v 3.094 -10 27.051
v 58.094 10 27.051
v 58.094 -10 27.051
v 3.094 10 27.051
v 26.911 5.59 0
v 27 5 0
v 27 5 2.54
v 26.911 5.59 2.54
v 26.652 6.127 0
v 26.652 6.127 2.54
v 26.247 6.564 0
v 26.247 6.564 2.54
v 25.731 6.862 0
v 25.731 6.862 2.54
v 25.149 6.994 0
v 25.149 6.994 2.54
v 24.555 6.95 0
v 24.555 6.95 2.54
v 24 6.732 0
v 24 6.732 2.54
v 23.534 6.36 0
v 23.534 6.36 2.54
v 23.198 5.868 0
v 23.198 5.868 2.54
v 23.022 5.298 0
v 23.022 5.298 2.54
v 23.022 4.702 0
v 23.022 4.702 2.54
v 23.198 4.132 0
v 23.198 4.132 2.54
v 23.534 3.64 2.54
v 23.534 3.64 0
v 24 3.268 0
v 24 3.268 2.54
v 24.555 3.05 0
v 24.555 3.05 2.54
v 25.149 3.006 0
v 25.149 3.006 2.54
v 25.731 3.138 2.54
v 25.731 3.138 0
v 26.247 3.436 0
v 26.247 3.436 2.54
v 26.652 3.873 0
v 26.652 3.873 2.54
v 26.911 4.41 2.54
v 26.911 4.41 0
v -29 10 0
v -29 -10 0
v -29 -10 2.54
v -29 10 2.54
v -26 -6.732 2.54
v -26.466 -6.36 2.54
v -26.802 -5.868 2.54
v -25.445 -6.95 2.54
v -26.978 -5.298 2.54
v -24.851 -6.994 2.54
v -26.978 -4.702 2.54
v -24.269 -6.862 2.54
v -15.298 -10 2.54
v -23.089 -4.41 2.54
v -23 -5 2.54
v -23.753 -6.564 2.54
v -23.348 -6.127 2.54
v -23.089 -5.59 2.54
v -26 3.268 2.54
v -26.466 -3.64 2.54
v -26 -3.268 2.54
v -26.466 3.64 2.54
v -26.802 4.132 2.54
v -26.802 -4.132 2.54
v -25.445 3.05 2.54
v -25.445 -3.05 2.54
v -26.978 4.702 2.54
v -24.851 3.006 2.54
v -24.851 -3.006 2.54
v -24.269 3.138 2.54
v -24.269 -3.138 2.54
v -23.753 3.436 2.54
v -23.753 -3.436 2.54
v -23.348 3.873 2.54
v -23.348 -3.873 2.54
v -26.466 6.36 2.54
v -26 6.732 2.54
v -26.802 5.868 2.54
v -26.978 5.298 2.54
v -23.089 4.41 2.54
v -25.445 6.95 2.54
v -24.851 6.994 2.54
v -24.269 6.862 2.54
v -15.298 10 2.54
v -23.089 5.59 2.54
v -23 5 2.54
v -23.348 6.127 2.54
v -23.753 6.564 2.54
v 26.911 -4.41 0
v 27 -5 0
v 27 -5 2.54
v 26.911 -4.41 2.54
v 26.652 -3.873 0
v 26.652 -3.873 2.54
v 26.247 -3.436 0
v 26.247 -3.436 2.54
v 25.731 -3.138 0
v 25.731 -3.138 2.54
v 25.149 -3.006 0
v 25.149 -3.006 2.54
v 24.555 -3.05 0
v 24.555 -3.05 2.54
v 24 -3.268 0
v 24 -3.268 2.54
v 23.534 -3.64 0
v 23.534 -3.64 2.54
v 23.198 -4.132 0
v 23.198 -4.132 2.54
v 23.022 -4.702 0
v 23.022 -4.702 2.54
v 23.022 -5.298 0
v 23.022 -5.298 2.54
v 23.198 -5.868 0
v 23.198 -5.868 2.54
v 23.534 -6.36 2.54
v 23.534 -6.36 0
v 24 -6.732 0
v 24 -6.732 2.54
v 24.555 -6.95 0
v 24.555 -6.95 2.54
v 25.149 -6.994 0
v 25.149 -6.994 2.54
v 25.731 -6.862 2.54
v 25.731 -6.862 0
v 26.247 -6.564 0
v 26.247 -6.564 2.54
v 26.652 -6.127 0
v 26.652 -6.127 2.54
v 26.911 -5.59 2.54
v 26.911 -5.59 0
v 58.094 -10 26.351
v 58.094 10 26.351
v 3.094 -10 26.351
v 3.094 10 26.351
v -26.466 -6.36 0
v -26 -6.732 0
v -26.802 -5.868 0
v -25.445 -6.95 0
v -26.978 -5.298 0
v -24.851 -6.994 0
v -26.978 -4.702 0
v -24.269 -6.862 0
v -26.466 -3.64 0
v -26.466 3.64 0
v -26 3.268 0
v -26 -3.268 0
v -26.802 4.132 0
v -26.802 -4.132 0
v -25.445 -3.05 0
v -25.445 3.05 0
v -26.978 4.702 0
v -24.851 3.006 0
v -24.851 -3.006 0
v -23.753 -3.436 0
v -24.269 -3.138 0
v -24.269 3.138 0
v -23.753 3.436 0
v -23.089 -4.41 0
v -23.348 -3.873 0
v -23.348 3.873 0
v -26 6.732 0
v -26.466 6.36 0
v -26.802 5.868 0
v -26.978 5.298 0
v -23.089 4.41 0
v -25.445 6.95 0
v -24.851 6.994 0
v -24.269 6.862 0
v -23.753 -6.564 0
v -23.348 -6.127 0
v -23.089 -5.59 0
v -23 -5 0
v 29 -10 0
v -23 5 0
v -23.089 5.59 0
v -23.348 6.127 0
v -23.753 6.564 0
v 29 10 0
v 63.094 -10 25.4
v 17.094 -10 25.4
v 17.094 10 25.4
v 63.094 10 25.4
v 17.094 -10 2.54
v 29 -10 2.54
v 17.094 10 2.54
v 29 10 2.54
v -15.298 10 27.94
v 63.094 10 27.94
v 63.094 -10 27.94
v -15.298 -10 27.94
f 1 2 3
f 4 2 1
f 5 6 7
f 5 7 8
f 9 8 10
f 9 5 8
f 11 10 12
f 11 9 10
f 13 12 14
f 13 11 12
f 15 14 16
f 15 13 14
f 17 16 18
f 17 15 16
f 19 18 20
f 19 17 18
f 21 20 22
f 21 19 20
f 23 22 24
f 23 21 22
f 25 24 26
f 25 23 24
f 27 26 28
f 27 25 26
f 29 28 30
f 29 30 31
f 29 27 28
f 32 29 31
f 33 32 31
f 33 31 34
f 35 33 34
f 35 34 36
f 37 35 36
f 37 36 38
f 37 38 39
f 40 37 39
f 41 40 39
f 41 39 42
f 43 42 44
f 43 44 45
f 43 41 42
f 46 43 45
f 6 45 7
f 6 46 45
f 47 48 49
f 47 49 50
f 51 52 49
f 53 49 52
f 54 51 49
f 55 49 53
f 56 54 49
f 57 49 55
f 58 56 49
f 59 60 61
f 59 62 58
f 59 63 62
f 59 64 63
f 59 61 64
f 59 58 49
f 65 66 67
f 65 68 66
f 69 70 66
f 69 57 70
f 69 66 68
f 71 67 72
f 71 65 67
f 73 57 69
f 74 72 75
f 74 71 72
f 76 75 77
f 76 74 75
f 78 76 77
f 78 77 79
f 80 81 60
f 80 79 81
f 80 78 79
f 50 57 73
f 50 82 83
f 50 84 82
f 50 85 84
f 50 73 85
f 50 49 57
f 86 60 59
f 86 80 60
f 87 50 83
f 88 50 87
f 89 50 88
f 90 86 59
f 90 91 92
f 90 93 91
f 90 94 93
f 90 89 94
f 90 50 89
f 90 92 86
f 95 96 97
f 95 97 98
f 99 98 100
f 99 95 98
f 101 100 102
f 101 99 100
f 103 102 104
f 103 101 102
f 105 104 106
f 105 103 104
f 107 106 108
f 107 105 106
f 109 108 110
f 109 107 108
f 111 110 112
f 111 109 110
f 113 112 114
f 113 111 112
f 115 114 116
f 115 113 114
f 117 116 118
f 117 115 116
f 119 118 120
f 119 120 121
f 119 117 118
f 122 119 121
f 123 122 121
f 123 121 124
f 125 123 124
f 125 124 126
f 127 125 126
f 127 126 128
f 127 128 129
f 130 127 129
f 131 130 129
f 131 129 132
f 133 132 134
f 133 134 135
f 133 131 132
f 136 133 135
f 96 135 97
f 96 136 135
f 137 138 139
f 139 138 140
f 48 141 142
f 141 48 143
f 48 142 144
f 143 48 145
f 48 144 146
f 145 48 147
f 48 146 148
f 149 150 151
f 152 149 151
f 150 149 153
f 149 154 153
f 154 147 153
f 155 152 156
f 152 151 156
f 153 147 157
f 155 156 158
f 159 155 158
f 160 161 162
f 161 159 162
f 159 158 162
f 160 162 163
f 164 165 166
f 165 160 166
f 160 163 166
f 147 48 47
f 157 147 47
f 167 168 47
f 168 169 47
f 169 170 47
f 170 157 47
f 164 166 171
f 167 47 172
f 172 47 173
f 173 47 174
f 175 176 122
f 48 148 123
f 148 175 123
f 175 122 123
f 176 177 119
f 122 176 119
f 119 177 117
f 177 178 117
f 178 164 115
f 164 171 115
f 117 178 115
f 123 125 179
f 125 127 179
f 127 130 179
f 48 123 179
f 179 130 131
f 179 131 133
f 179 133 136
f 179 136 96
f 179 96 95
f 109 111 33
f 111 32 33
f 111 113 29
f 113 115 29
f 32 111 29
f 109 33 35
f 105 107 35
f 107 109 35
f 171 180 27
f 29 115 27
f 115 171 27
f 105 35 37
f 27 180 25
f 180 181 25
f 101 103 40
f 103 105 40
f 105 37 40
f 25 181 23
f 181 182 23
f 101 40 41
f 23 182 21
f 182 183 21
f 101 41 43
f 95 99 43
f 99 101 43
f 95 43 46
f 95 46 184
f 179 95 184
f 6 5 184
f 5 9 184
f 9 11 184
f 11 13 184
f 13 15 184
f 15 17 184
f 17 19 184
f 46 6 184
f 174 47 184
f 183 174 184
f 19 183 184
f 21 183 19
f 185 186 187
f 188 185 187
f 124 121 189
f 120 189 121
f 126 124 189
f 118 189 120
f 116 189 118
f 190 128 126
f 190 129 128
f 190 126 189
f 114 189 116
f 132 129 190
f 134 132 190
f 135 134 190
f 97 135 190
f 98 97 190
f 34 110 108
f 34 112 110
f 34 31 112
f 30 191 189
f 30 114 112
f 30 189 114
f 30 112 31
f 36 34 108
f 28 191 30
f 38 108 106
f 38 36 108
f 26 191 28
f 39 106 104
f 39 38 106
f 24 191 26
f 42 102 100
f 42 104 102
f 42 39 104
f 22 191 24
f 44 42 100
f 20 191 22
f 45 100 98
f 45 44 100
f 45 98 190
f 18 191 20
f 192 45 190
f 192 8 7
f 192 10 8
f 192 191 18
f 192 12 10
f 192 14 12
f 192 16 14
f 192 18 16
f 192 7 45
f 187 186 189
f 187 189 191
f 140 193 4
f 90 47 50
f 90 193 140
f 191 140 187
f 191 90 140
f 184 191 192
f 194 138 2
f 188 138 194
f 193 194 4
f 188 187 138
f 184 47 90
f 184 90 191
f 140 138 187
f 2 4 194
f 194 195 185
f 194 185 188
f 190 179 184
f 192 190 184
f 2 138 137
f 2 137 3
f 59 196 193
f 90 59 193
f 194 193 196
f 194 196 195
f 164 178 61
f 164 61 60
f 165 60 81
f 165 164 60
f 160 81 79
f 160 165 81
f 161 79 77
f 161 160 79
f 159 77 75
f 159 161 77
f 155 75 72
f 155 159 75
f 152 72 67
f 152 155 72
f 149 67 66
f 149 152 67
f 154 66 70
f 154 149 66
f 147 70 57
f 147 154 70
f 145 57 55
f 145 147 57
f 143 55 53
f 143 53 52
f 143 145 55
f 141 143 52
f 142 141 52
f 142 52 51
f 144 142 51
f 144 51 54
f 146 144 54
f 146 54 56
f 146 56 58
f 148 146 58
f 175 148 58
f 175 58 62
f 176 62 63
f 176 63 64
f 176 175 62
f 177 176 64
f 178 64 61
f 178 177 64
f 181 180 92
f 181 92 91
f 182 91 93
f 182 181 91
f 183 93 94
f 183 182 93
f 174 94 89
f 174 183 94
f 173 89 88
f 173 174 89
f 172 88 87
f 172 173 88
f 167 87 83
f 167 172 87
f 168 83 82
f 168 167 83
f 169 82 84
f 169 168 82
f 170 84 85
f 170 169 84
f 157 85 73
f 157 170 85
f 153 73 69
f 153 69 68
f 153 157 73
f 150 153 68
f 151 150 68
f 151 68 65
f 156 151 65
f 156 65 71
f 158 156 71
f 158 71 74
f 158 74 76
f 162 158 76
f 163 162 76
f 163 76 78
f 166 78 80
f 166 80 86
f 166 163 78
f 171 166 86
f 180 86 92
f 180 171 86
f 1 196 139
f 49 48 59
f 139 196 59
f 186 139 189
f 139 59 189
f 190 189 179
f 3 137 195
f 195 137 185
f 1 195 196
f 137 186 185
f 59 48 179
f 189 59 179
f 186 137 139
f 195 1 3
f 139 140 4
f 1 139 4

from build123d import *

# Parameters (mm, degrees)
F0_W     = 58
F0_H     = 20
F0_R     = 2
F1_DEPTH = 2.54
F2_W     = 32.392131
F2_H     = 20
F3_DEPTH = 25.4
F4_W     = 20
F4_H     = 2.54
F5_DEPTH = 46
F6_W     = 55
F6_H     = 0.7
F7_DEPTH = 20.001


with BuildPart() as f1:
    # F0 (on Top) → F1 (new body)
    with BuildSketch(Plane.XY):
        Rectangle(F0_W, F0_H)
        with Locations((-25, -5)):
            Circle(F0_R, mode=Mode.SUBTRACT)
        with Locations((25, -5)):
            Circle(F0_R, mode=Mode.SUBTRACT)
        with Locations((-25, 5)):
            Circle(F0_R, mode=Mode.SUBTRACT)
        with Locations((25, 5)):
            Circle(F0_R, mode=Mode.SUBTRACT)
    extrude(amount=F1_DEPTH)

    # F2 (on face) → F3 (join)
    with BuildSketch(Plane.XY.offset(2.54)):
        with Locations((0.897951, 0)):
            Rectangle(F2_W, F2_H)
    extrude(amount=F3_DEPTH)

    # F4 (on face) → F5 (join)
    with BuildSketch(Plane.YZ.offset(17.094016)):
        with Locations((0, 26.67)):
            Rectangle(F4_W, F4_H)
    extrude(amount=F5_DEPTH)

    # F6 (on face) → F7 (cut, through all)
    with BuildSketch(Plane(origin=(0, 10, 0), x_dir=(-1, 0, 0), z_dir=(0, 1, 0))):
        with Locations((-30.594016, 26.701)):
            Rectangle(F6_W, F6_H)
    extrude(amount=-F7_DEPTH, mode=Mode.SUBTRACT)


solid = f1.part
